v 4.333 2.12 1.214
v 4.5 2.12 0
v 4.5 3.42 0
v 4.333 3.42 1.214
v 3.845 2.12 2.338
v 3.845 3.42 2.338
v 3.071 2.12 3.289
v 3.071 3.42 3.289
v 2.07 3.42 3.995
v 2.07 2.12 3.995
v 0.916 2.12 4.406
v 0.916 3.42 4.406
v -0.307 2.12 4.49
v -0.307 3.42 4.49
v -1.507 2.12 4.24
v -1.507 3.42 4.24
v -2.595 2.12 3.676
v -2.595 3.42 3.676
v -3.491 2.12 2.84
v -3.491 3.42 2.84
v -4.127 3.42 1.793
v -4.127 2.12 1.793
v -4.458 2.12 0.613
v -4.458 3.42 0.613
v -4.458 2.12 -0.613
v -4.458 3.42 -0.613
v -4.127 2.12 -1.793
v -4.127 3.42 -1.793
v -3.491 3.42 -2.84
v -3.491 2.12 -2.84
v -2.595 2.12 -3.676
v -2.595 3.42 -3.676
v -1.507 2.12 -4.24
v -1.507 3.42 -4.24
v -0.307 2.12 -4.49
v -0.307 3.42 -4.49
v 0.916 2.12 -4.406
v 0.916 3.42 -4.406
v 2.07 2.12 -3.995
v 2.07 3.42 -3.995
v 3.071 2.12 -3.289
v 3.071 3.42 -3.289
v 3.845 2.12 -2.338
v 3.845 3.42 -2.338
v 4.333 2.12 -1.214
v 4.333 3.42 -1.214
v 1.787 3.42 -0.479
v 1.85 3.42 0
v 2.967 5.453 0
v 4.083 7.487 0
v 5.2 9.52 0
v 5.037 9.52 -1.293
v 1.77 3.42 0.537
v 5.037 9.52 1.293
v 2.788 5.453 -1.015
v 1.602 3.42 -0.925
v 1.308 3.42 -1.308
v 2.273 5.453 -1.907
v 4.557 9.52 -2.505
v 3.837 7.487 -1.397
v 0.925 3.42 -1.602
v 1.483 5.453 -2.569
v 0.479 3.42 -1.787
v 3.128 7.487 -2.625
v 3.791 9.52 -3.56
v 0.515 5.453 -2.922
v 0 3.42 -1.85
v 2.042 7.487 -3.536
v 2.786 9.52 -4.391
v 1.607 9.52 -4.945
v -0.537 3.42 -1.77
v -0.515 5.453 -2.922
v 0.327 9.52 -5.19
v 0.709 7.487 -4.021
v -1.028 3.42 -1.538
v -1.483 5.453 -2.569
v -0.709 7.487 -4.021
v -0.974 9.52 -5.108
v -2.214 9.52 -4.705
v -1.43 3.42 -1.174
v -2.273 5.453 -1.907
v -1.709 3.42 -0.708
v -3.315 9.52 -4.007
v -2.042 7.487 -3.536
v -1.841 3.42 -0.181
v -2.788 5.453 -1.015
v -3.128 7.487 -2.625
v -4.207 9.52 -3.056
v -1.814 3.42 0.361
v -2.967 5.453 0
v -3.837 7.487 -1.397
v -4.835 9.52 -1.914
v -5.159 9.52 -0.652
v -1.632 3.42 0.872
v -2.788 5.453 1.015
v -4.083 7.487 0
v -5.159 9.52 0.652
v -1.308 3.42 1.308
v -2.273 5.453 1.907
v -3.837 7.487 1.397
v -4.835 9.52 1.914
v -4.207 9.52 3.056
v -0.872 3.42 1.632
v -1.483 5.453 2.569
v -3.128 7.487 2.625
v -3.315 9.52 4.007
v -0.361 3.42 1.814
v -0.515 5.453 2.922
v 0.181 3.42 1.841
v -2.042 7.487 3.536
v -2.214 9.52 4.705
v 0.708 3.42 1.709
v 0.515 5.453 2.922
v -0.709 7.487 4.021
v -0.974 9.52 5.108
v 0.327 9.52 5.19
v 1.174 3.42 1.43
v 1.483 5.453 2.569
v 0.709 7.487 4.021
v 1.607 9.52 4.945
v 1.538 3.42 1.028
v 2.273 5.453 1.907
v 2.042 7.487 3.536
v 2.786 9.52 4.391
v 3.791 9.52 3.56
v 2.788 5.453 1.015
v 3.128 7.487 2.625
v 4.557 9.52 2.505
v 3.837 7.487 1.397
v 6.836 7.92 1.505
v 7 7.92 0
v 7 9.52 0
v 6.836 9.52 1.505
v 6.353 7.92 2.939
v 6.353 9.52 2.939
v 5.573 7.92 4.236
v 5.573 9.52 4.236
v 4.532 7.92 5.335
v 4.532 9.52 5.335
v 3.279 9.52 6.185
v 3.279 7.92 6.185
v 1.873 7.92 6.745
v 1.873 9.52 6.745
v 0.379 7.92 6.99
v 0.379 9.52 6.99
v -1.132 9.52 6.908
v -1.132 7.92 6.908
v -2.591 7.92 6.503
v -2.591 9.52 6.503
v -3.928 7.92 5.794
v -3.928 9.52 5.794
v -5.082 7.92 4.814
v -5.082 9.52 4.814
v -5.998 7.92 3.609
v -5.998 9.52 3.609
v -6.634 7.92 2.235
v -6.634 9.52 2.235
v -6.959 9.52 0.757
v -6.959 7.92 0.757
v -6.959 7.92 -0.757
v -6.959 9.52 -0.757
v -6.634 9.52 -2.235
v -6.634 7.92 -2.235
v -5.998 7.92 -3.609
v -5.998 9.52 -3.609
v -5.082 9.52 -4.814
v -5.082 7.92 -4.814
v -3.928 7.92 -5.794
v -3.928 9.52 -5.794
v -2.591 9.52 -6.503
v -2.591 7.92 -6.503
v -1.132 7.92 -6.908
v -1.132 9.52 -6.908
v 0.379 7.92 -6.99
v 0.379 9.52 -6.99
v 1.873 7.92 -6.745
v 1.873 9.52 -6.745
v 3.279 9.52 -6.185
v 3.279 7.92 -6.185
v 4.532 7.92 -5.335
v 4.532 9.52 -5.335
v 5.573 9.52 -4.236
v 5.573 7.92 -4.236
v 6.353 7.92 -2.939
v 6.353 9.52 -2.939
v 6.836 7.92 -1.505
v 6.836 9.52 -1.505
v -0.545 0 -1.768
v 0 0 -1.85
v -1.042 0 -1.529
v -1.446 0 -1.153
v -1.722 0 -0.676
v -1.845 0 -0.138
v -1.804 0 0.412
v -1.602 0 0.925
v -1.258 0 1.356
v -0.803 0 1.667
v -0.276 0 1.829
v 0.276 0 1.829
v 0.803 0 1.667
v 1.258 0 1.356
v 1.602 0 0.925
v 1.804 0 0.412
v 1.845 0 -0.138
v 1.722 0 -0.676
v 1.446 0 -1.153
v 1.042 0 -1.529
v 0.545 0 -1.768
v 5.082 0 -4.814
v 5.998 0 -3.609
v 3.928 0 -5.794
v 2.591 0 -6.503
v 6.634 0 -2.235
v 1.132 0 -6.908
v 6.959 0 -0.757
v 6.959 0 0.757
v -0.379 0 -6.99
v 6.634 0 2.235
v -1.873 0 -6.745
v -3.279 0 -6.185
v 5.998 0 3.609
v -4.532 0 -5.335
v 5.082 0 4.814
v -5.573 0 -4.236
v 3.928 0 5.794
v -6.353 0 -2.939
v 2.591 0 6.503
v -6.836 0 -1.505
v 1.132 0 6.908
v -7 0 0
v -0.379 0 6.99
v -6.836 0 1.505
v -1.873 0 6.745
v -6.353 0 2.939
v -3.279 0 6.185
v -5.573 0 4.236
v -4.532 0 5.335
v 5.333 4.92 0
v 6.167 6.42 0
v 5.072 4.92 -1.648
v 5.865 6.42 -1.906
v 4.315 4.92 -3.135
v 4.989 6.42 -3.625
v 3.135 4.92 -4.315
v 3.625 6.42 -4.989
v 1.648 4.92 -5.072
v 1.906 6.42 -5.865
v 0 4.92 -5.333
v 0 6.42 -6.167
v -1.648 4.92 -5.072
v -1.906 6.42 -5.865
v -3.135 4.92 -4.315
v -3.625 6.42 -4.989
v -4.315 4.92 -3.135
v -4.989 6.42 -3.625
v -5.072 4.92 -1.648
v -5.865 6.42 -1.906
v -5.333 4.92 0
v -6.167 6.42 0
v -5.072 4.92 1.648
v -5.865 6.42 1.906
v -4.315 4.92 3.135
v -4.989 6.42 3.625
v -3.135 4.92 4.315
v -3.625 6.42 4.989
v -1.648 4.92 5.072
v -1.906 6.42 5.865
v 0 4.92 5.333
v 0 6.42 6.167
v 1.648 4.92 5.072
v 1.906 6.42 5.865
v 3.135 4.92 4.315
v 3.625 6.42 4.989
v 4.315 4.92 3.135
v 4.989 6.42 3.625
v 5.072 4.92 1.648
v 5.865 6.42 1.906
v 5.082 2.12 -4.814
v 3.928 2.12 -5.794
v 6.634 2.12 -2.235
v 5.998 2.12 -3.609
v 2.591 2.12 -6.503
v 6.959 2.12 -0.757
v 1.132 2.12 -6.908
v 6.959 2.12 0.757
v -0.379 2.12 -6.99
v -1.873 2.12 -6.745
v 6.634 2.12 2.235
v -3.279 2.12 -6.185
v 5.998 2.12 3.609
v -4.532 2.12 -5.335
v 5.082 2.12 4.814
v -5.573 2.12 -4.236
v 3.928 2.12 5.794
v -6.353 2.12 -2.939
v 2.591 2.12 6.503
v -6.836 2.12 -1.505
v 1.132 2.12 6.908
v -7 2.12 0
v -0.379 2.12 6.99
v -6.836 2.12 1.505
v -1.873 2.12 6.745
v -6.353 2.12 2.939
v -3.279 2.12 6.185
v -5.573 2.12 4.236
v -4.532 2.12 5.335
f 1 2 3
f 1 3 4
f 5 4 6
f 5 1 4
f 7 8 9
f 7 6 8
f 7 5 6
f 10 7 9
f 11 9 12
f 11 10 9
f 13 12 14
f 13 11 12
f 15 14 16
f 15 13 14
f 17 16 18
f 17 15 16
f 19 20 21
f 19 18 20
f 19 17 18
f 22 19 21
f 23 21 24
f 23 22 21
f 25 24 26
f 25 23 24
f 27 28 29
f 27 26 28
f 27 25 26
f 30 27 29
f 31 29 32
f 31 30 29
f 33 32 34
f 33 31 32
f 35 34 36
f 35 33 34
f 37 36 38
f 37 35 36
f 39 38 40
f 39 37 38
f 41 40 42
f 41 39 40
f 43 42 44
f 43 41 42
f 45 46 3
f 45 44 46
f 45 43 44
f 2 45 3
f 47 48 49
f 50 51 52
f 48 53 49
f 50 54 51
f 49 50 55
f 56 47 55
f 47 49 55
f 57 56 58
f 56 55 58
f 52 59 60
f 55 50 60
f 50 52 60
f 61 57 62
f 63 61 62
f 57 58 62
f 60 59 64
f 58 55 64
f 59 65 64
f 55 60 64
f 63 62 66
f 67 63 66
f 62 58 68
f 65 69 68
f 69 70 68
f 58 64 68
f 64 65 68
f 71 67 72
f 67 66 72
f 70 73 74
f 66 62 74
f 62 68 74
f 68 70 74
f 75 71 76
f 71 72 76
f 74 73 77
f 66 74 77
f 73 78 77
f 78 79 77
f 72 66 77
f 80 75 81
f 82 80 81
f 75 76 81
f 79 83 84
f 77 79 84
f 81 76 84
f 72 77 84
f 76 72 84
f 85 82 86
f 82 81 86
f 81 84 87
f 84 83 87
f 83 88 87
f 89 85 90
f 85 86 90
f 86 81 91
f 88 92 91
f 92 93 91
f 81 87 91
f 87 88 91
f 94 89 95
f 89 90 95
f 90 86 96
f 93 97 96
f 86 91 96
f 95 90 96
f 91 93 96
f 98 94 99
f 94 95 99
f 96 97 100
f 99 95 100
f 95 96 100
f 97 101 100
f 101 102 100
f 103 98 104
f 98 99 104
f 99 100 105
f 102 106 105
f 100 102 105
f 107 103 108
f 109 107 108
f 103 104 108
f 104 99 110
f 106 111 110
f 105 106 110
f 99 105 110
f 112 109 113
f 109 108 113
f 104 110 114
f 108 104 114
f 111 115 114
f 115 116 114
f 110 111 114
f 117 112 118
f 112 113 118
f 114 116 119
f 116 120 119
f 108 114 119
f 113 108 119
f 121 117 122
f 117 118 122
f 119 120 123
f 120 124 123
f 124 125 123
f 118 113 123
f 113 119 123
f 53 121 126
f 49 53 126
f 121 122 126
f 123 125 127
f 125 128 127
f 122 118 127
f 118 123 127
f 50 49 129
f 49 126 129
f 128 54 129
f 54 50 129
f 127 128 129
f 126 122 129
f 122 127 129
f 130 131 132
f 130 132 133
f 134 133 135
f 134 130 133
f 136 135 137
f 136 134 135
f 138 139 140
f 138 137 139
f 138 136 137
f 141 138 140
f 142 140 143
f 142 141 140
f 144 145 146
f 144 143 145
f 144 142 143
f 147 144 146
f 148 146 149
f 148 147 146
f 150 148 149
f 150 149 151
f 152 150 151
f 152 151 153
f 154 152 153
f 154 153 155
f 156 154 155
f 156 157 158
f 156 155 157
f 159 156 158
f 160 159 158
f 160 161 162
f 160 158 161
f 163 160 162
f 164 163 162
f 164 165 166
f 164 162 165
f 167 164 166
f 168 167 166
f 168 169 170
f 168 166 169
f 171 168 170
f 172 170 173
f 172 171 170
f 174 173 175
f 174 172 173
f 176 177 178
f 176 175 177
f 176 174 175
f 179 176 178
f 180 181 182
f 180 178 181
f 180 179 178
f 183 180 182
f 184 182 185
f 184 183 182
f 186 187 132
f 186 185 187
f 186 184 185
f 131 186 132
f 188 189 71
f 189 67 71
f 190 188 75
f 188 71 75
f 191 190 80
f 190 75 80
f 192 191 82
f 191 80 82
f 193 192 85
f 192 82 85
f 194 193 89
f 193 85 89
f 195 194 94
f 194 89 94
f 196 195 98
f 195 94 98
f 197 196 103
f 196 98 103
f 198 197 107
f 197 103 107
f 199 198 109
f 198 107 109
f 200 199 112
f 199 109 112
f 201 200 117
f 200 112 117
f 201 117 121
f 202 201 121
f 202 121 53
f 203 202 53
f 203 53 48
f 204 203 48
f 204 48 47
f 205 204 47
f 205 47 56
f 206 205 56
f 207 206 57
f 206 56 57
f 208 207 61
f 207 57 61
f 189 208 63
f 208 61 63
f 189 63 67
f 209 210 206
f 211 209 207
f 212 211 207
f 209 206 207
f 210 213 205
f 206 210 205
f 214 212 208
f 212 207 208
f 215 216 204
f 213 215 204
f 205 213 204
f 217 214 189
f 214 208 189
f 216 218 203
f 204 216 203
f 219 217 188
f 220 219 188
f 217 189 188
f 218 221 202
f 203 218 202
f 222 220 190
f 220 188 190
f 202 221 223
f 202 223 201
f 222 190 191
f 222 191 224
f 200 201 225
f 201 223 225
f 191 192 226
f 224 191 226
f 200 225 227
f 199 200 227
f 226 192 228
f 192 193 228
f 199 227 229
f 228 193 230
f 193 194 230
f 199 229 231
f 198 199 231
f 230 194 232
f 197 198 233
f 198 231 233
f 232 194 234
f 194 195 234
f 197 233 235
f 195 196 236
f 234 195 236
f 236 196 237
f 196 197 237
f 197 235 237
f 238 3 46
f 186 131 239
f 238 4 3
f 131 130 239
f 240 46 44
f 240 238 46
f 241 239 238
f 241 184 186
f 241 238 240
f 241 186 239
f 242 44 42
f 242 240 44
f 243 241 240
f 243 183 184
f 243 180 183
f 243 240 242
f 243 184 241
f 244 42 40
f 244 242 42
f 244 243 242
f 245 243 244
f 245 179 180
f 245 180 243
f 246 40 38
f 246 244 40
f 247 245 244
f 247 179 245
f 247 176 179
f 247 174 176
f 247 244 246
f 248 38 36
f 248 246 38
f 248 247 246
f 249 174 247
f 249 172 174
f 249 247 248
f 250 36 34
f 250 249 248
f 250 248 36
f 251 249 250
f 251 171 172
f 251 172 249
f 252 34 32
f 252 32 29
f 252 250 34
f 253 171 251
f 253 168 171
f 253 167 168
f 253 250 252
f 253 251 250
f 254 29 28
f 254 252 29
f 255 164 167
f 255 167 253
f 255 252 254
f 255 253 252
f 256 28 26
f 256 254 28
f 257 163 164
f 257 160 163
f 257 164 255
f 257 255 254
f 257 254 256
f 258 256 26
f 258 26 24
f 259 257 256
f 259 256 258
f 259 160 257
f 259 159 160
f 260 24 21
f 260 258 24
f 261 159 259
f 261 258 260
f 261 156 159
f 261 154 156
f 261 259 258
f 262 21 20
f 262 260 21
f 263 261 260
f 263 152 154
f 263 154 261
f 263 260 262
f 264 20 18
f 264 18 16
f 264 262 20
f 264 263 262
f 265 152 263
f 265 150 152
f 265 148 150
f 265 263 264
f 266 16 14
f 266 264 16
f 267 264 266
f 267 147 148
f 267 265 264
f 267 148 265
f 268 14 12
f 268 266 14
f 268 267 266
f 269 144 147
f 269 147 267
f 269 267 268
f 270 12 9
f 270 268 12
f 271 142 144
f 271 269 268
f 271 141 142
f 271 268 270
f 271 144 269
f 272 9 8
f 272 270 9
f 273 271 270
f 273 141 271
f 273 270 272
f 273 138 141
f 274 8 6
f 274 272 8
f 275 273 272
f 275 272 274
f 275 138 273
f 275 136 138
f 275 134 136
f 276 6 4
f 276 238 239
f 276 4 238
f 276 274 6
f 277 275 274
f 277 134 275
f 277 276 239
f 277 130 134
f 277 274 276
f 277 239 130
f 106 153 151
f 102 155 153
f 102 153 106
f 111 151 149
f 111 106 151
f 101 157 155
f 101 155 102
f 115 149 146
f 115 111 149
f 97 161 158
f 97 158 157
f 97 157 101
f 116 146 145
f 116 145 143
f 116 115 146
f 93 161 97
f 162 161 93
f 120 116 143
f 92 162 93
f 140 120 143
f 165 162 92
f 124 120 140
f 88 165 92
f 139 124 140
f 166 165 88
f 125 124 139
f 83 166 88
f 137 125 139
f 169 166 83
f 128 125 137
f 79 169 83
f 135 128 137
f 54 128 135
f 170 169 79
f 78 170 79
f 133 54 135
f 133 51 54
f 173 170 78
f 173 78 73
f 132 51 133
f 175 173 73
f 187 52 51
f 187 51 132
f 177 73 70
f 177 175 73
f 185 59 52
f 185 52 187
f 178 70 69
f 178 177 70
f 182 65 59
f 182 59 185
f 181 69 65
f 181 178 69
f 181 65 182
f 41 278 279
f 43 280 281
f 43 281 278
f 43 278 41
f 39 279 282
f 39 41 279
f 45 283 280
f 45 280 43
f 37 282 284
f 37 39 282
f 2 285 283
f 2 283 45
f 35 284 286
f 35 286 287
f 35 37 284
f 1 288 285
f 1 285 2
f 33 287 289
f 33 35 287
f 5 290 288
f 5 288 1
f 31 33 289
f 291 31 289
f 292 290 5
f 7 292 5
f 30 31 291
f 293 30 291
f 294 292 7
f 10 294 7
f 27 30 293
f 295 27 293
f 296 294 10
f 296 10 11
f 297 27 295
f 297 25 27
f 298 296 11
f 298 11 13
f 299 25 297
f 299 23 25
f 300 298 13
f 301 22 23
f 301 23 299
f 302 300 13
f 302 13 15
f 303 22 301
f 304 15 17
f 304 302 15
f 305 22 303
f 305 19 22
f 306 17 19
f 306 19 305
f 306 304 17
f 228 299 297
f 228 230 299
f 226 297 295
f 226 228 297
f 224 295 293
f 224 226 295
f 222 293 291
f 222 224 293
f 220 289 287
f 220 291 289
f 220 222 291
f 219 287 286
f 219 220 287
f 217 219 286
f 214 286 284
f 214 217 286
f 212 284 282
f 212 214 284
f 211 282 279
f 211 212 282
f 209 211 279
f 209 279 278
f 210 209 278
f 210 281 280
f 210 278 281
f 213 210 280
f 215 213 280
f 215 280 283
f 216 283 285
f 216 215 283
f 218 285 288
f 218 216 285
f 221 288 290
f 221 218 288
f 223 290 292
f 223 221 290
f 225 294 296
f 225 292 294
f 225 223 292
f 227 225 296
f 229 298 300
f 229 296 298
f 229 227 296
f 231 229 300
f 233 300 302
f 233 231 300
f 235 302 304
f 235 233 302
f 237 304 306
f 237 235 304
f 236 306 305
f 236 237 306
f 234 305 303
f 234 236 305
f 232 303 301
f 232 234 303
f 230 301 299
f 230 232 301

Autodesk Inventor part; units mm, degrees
ref_plane "YZ Plane" through (0, 0, 0) normal (1, 0, 0) x (0, 1, 0)
sketch "Sketch1" plane through (0, 0, 0) normal (0, 1, 0) x (-1, 0, 0)
  circle A0 centre (0, 0) radius 7
  dimension "d0" = 14
extrude "Extrusion1" add sketch "Sketch1" along normal blind 2.12
sketch "Sketch3" plane through (0, 2.12, 0) normal (0, 1, 0) x (1, 0, 0)
  circle A0 centre (0, 0) radius 4.5
  dimension "d4" = 9
extrude "Extrusion2" add sketch "Sketch3" along normal blind 1.3
ref_plane "Work Plane2" through (0, 7.92, 0) normal (0, 1, 0) x (1, 0, 0)
sketch "Sketch5" plane through (0, 7.92, 0) normal (0, 1, 0) x (1, 0, 0)
  circle A0 centre (0, 0) radius 7
  dimension "d8" = 14
loft "Loft1" add profiles "Sketch5" section 1 edges at (-4.5, 3.42, 0)
sketch "Sketch7" plane through (0, 7.92, 0) normal (0, 1, 0) x (1, 0, 0)
  circle A0 centre (0, 0) radius 7
extrude "Extrusion3" add sketch "Sketch7" along normal blind 1.6
sketch "Sketch8" plane through (0, 9.52, 0) normal (0, 1, 0) x (1, 0, 0)
  circle A0 centre (0, 0) radius 5.2
  dimension "d15" = 10.4
ref_plane "Work Plane3" through (0, 3.42, 0) normal (0, 1, 0) x (1, 0, 0)
sketch "Sketch10" plane through (0, 3.42, 0) normal (0, 1, 0) x (1, 0, 0)
  circle A0 centre (0, 0) radius 1.85
  dimension "d22" = 3.7
loft "Loft3" cut profiles "Sketch8", "Sketch10"
hole "Hole1" at (0, 0, 0) direction (0, 1, 0) diameter 3.7 end through all
equation "\"d34\" = Thickness"
equation "\"BendRadius\" = Thickness"
equation "\"BendReliefWidth\" = Thickness"
equation "\"BendReliefDepth\" = 0.5 * Thickness"
equation "\"CornerReliefSize\" = 4 * Thickness"
equation "\"MinimumRemnant\" = 2 * Thickness"
equation "\"TransitionRadius\" = BendRadius"
equation "\"JacobiRadiusSize\" = Thickness"
equation "\"GapSize\" = Thickness"
equation "\"Thickness\" = 0.5"
